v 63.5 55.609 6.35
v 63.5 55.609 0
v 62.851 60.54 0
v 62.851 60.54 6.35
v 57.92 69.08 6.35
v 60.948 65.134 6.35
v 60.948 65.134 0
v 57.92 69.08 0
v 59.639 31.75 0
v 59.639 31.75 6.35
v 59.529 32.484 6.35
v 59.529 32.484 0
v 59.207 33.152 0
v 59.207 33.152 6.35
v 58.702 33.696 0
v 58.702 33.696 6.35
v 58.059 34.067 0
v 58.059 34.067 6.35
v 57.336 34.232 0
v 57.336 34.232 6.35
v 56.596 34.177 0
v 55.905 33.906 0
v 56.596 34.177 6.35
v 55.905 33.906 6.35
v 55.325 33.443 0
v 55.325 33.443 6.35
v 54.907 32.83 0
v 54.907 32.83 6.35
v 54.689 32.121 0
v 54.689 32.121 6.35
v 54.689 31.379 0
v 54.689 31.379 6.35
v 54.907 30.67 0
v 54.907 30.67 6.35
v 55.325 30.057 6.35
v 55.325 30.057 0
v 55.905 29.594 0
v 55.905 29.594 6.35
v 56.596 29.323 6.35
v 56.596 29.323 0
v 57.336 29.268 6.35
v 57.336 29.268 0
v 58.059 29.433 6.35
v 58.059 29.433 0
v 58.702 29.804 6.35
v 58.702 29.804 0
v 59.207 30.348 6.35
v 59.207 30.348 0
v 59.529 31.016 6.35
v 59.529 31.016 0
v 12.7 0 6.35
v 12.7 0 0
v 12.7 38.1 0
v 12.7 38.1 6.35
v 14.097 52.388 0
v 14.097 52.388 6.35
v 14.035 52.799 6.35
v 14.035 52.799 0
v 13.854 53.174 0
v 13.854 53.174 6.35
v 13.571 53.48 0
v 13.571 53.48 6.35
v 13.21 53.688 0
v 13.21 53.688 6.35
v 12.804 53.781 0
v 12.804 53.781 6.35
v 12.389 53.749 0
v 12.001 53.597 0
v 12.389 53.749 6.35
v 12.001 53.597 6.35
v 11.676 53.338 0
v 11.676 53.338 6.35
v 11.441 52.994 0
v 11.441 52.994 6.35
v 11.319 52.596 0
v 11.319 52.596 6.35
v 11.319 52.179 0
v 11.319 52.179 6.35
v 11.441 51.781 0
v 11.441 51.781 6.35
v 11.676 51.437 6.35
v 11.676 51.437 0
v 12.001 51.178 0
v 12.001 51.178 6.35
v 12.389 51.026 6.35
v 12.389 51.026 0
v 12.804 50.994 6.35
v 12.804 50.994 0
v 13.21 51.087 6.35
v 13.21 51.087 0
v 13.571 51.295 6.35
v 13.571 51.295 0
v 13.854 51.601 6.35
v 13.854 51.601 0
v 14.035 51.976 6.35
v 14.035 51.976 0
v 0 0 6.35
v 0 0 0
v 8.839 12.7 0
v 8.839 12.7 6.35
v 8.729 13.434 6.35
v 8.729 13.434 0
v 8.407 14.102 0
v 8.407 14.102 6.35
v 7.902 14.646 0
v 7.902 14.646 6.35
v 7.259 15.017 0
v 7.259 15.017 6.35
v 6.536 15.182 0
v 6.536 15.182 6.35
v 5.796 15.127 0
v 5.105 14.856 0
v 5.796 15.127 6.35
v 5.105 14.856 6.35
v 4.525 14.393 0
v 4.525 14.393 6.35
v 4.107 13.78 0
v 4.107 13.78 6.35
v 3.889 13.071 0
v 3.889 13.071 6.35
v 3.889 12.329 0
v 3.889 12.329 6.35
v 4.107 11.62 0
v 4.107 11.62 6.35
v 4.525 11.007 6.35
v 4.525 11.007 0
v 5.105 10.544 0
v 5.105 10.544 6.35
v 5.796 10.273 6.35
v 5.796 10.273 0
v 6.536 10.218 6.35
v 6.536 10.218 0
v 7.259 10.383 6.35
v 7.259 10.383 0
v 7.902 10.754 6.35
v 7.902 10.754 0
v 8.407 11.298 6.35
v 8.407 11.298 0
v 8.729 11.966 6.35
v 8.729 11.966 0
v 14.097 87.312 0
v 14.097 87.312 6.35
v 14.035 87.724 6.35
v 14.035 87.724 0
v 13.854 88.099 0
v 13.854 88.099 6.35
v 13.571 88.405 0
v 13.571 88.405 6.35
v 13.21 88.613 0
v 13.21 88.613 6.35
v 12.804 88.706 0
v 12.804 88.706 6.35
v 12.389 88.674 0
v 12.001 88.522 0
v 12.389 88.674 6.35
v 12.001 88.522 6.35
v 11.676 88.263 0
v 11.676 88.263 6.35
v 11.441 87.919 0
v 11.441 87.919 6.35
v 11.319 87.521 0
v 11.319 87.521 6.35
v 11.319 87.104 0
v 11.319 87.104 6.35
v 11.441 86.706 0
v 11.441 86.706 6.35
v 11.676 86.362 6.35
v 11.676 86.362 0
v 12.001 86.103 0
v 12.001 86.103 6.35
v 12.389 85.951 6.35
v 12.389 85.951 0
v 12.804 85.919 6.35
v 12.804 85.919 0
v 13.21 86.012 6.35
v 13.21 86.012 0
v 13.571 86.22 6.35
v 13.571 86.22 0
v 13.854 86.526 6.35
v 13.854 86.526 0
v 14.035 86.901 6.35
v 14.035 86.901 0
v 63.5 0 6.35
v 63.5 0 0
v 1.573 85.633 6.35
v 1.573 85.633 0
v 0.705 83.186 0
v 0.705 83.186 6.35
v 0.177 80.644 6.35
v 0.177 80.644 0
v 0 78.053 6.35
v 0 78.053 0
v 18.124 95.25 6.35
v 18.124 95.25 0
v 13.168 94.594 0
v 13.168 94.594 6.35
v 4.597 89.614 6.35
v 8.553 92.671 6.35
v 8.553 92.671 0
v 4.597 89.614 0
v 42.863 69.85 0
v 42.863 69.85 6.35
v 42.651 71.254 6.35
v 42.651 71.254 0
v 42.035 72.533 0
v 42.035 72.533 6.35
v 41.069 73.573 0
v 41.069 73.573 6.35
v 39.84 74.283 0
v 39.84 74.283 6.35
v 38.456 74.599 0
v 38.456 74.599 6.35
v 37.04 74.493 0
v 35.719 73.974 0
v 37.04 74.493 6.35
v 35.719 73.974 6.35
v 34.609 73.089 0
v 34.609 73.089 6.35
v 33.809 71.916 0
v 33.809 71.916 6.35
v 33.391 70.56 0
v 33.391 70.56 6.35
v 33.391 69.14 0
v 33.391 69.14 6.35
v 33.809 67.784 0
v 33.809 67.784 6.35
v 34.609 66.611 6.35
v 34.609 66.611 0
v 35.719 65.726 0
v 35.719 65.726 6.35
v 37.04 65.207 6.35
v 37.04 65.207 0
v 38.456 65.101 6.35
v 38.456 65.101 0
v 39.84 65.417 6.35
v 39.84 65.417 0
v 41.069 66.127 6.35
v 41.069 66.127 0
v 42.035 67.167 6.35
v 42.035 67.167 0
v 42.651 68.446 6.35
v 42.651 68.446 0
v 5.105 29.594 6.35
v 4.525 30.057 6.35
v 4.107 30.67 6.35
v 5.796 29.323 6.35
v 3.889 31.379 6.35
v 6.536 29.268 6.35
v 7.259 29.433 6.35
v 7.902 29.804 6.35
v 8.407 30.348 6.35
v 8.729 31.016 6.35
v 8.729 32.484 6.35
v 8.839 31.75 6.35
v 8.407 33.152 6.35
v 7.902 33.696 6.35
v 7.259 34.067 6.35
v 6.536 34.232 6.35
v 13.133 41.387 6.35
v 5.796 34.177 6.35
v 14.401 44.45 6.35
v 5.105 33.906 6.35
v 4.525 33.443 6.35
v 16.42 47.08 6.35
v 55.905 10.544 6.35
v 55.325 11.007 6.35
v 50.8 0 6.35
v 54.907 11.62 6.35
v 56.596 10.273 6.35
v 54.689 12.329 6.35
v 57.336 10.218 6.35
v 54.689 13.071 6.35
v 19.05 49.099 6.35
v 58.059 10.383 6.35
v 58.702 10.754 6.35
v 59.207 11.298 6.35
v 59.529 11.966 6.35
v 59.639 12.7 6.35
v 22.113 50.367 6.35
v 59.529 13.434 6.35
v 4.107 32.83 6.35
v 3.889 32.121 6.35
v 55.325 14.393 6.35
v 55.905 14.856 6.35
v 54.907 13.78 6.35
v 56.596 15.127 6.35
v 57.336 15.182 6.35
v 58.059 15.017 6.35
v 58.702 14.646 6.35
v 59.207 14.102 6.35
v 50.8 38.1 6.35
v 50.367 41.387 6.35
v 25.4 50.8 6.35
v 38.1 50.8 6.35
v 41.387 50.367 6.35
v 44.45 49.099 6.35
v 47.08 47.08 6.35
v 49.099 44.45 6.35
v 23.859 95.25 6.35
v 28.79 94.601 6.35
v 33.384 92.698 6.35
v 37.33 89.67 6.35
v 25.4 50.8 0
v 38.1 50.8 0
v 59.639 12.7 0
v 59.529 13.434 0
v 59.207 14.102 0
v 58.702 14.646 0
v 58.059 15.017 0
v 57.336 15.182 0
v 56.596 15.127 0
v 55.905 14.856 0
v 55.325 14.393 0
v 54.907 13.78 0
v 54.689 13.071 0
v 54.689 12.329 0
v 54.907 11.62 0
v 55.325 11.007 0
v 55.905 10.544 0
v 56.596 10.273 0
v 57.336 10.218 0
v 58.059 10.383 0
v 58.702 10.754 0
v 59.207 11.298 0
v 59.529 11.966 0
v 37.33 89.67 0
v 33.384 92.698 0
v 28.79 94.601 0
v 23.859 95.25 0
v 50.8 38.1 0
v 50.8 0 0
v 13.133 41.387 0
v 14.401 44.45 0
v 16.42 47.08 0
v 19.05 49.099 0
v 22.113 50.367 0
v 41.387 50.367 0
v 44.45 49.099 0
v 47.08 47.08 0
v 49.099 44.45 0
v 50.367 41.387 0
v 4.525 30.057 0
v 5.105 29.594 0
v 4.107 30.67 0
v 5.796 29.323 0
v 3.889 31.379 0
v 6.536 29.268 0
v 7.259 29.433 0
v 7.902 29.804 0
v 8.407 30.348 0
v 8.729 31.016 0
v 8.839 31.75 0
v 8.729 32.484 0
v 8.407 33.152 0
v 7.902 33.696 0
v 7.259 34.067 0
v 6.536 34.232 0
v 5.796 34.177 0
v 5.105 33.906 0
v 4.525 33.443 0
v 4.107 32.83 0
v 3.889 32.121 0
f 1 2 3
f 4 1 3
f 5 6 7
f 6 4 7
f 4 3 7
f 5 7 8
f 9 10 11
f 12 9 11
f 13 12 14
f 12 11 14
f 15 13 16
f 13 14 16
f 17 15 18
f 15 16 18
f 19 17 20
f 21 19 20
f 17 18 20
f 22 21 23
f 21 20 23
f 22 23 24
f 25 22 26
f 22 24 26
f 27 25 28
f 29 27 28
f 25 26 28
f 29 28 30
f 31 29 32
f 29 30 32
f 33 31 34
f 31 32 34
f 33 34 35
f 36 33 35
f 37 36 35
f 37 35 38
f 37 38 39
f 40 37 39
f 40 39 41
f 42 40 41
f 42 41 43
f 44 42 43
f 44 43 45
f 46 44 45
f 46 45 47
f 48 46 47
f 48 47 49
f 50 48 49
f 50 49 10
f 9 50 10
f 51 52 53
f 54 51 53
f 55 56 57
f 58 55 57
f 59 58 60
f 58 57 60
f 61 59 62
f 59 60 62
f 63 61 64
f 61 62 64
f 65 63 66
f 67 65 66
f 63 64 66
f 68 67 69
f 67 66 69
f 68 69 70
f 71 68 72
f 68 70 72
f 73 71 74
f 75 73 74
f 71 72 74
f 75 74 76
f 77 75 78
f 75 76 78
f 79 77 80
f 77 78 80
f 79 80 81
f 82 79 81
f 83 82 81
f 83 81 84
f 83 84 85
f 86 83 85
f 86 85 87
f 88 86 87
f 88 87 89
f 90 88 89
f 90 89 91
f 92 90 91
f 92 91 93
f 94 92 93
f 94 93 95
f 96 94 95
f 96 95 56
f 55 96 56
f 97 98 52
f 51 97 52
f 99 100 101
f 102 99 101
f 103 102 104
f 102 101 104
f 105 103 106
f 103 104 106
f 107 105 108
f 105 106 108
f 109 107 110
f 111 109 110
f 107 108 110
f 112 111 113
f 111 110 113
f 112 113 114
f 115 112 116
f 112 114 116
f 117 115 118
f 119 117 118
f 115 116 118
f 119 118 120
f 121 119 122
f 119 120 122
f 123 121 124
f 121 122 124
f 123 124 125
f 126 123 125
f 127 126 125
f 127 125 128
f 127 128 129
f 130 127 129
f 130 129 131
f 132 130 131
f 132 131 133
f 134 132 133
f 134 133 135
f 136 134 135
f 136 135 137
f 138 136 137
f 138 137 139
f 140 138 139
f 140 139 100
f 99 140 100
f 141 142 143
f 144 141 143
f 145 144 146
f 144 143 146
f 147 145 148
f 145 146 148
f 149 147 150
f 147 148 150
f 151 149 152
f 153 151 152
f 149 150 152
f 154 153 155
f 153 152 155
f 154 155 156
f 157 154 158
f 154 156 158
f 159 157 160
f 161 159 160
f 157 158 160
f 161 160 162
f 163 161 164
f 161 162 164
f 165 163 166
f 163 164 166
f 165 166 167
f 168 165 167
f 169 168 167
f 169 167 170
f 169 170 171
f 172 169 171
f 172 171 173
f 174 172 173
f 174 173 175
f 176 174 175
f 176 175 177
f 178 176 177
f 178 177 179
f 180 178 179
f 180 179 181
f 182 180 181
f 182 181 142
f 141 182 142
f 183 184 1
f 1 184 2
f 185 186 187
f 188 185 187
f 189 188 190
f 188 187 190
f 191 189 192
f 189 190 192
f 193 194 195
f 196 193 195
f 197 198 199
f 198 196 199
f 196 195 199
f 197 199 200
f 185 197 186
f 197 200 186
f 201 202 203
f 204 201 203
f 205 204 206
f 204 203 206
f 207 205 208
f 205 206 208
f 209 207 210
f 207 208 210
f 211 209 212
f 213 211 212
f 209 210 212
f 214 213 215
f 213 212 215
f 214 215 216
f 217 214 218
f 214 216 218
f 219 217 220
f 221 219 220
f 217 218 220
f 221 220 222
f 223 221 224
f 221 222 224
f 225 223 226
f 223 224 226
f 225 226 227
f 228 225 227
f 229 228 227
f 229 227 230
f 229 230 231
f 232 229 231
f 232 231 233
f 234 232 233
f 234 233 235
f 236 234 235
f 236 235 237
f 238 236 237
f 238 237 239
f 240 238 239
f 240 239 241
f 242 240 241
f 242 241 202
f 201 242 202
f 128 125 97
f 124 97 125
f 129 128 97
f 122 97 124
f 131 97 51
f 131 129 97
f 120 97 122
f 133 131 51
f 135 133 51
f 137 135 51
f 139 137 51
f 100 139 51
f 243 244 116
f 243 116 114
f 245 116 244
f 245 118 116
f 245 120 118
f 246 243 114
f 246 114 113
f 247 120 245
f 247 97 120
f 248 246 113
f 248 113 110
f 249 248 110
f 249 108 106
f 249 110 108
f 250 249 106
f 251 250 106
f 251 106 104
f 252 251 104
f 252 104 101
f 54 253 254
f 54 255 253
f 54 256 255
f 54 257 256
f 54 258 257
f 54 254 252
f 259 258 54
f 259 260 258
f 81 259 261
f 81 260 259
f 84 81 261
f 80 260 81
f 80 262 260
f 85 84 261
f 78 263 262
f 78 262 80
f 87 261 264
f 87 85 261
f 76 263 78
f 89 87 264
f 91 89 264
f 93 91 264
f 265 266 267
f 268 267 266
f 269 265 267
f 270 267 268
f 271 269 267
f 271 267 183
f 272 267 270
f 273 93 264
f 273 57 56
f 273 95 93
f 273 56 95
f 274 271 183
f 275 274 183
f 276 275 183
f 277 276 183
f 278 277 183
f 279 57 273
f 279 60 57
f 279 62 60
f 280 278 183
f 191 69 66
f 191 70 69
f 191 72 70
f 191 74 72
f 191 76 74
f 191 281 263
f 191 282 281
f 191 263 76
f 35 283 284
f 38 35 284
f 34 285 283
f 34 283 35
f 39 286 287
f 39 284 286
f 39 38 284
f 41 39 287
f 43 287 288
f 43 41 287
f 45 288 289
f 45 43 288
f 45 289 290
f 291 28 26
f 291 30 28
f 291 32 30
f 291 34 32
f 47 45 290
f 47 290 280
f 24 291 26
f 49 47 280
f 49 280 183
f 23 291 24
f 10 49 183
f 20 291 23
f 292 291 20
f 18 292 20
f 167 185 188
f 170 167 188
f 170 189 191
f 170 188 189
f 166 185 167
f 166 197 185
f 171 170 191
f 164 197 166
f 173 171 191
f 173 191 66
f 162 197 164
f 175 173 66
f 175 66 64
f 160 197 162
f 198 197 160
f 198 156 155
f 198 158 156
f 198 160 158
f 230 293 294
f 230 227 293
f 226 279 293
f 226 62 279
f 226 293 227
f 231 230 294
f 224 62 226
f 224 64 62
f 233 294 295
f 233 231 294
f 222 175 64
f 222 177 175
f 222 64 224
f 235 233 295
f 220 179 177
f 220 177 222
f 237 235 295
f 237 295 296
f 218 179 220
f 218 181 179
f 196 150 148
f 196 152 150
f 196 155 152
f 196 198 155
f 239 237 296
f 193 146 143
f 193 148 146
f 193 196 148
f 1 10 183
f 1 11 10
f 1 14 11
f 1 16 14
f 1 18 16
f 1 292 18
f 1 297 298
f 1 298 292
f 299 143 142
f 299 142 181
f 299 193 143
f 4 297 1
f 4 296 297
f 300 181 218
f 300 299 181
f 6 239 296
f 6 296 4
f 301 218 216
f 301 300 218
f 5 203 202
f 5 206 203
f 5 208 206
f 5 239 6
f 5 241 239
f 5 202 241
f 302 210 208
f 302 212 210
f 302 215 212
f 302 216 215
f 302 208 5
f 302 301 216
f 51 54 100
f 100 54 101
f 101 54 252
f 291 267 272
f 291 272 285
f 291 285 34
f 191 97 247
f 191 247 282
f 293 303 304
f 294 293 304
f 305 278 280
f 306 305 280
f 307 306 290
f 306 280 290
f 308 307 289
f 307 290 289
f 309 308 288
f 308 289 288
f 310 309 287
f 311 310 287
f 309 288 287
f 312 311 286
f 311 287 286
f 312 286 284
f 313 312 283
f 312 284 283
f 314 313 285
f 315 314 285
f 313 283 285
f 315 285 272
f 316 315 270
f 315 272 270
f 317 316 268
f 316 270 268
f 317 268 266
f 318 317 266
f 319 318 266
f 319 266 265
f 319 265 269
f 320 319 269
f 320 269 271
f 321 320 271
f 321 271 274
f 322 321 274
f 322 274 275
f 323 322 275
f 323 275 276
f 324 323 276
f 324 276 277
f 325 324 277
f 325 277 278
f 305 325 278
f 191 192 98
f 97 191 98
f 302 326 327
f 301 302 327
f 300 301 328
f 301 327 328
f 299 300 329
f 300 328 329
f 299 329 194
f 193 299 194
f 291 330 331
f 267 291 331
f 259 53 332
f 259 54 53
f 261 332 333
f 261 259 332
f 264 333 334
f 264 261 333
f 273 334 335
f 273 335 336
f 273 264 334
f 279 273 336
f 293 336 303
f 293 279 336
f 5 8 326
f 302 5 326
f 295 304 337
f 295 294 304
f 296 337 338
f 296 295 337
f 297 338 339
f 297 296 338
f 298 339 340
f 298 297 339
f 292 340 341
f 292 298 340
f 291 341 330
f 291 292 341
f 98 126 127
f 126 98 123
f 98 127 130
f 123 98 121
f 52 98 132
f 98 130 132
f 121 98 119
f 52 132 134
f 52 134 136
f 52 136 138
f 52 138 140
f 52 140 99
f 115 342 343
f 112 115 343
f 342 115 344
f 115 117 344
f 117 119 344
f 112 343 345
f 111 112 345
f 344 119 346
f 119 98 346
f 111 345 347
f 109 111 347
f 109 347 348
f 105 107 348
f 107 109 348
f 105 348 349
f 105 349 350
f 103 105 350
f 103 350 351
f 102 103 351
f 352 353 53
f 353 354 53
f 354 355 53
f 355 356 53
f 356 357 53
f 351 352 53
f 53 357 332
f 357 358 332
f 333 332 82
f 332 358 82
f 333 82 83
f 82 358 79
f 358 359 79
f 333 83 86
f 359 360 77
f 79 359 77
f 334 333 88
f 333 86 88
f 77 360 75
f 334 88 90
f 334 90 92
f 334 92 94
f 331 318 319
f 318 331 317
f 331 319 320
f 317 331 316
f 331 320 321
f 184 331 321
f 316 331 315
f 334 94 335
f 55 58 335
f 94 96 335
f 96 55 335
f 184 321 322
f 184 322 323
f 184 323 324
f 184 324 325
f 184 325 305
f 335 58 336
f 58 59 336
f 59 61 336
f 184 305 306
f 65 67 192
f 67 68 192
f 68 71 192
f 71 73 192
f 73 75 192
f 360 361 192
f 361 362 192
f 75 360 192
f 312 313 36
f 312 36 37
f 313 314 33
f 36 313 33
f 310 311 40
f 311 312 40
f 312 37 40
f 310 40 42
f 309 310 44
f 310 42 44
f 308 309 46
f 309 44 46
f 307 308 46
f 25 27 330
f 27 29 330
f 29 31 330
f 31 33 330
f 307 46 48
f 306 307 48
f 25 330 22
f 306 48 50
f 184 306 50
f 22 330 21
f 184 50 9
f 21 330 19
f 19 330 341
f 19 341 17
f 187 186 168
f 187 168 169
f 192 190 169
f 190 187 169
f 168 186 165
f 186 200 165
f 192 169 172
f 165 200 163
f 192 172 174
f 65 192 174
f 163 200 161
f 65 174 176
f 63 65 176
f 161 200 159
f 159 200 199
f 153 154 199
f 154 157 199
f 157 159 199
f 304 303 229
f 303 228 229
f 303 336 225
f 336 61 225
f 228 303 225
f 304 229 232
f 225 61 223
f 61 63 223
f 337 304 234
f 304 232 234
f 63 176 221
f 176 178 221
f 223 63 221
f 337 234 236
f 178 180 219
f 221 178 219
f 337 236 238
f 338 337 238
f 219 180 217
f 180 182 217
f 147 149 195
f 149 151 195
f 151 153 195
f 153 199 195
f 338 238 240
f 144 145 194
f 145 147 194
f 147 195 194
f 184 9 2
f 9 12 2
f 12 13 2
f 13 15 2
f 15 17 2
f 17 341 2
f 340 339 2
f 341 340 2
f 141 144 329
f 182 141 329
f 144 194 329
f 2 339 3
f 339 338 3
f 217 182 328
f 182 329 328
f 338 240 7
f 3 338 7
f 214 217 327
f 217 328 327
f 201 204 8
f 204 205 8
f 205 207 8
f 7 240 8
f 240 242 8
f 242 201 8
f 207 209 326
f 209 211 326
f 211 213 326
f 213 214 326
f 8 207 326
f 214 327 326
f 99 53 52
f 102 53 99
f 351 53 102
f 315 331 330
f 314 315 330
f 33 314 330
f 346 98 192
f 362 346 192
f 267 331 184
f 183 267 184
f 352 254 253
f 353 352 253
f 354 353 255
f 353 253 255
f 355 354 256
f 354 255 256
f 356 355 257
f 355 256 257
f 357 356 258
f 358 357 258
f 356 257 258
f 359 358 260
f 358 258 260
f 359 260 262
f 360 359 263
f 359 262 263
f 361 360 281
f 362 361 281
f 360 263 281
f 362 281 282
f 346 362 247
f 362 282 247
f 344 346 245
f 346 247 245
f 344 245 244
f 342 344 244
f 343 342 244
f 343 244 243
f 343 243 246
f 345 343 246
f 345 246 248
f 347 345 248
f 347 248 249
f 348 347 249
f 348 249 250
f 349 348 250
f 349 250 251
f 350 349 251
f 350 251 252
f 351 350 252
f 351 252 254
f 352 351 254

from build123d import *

# Parameters (mm, degrees)
BOSS_EXTRUDE1_DEPTH = 6.35
CUT_EXTRUDE1_REACH  = 116.652
SKETCH2_R           = 2.4892
CUT_EXTRUDE3_REACH  = 116.652
SKETCH4_R           = 1.397
SKETCH4_R_2         = 4.7625
FILLET4_R           = 12.7
FILLET5_R           = 19.05


with BuildPart() as part:
    # Sketch1 → Boss-Extrude1 (new body)
    with BuildSketch(Plane.XY):
        Polygon((0, 0), (12.7, 0), (12.7, 50.8), (50.8, 50.8), (50.8, 0), (63.5, 0), (63.5, 63.5), (31.75, 95.25), (6.35, 95.25), (0, 82.55), align=None)
    extrude(amount=BOSS_EXTRUDE1_DEPTH)

    # Sketch2 → Cut-Extrude1 (cut, up to next)
    with BuildSketch(Plane.XY.offset(6.35), mode=Mode.PRIVATE) as cut_extrude1_sk1:
        with Locations((6.35, 12.7)):
            Circle(SKETCH2_R)
    cut_extrude1_tool1 = extrude(cut_extrude1_sk1.sketch, amount=-CUT_EXTRUDE1_REACH, mode=Mode.PRIVATE) & part.part
    # Sketch2 → Cut-Extrude1 (cut, up to next)
    with BuildSketch(Plane.XY.offset(6.35), mode=Mode.PRIVATE) as cut_extrude1_sk2:
        with Locations((6.35, 31.75)):
            Circle(SKETCH2_R)
    cut_extrude1_tool2 = extrude(cut_extrude1_sk2.sketch, amount=-CUT_EXTRUDE1_REACH, mode=Mode.PRIVATE) & part.part
    # Sketch2 → Cut-Extrude1 (cut, up to next)
    with BuildSketch(Plane.XY.offset(6.35), mode=Mode.PRIVATE) as cut_extrude1_sk3:
        with Locations((57.15, 12.7)):
            Circle(SKETCH2_R)
    cut_extrude1_tool3 = extrude(cut_extrude1_sk3.sketch, amount=-CUT_EXTRUDE1_REACH, mode=Mode.PRIVATE) & part.part
    # Sketch2 → Cut-Extrude1 (cut, up to next)
    with BuildSketch(Plane.XY.offset(6.35), mode=Mode.PRIVATE) as cut_extrude1_sk4:
        with Locations((57.15, 31.75)):
            Circle(SKETCH2_R)
    cut_extrude1_tool4 = extrude(cut_extrude1_sk4.sketch, amount=-CUT_EXTRUDE1_REACH, mode=Mode.PRIVATE) & part.part
    add(cut_extrude1_tool1.solids().sort_by_distance((6.35, 12.7, 6.35))[0], mode=Mode.SUBTRACT)
    add(cut_extrude1_tool2.solids().sort_by_distance((6.35, 31.75, 6.35))[0], mode=Mode.SUBTRACT)
    add(cut_extrude1_tool3.solids().sort_by_distance((57.15, 12.7, 6.35))[0], mode=Mode.SUBTRACT)
    add(cut_extrude1_tool4.solids().sort_by_distance((57.15, 31.75, 6.35))[0], mode=Mode.SUBTRACT)

    # Sketch4 → Cut-Extrude3 (cut, up to next)
    with BuildSketch(Plane.XY.offset(6.35), mode=Mode.PRIVATE) as cut_extrude3_sk1:
        with Locations((12.7, 52.3875)):
            Circle(SKETCH4_R)
    cut_extrude3_tool1 = extrude(cut_extrude3_sk1.sketch, amount=-CUT_EXTRUDE3_REACH, mode=Mode.PRIVATE) & part.part
    # Sketch4 → Cut-Extrude3 (cut, up to next)
    with BuildSketch(Plane.XY.offset(6.35), mode=Mode.PRIVATE) as cut_extrude3_sk2:
        with Locations((12.7, 87.3125)):
            Circle(SKETCH4_R)
    cut_extrude3_tool2 = extrude(cut_extrude3_sk2.sketch, amount=-CUT_EXTRUDE3_REACH, mode=Mode.PRIVATE) & part.part
    # Sketch4 → Cut-Extrude3 (cut, up to next)
    with BuildSketch(Plane.XY.offset(6.35), mode=Mode.PRIVATE) as cut_extrude3_sk3:
        with Locations((38.1, 69.85)):
            Circle(SKETCH4_R_2)
    cut_extrude3_tool3 = extrude(cut_extrude3_sk3.sketch, amount=-CUT_EXTRUDE3_REACH, mode=Mode.PRIVATE) & part.part
    add(cut_extrude3_tool1.solids().sort_by_distance((12.7, 52.3875, 6.35))[0], mode=Mode.SUBTRACT)
    add(cut_extrude3_tool2.solids().sort_by_distance((12.7, 87.3125, 6.35))[0], mode=Mode.SUBTRACT)
    add(cut_extrude3_tool3.solids().sort_by_distance((38.1, 69.85, 6.35))[0], mode=Mode.SUBTRACT)

    # Fillet4
    fillet4_edges = [part.edges().sort_by_distance(p)[0] for p in [
        (50.8, 50.8, 3.175),
        (12.7, 50.8, 3.175),
    ]]
    fillet(fillet4_edges, radius=FILLET4_R)

    # Fillet5
    # the kernel refuses this fillet: 19.05 mm, written as the material it takes off along each edge
    with BuildSketch(Plane(origin=(0, 82.55, -11.242737428), x_dir=(0, -1, 0), z_dir=(0, 0, 1))) as fillet5_piece_1:
        with BuildLine():
            CenterArc((FILLET5_R * 0.2360679775, FILLET5_R), FILLET5_R, 243.434948823, 26.565051177)
            Line((-FILLET5_R * 0.211145618, FILLET5_R * 0.105572809), (0, 0))
            Line((0, 0), (FILLET5_R * 0.2360679775, 0))
        make_face()
    extrude(amount=28.835474857, mode=Mode.SUBTRACT)
    with BuildSketch(Plane(origin=(6.35, 95.25, -29.433868714), x_dir=(-0.4472135954999575, -0.8944271909999162, 0), z_dir=(0, 0, 1))) as fillet5_piece_2:
        with BuildLine():
            CenterArc((FILLET5_R * 0.61803398875, FILLET5_R), FILLET5_R, 206.565051177, 63.434948823)
            Line((-FILLET5_R * 0.27639320225, FILLET5_R * 0.5527864045), (0, 0))
            Line((0, 0), (FILLET5_R * 0.61803398875, 0))
        make_face()
    extrude(amount=65.217737428, mode=Mode.SUBTRACT)
    with BuildSketch(Plane(origin=(31.75, 95.25, -19.726920908), x_dir=(-1, 0, 0), z_dir=(0, 0, 1)), Plane(origin=(63.5, 63.5, -19.726920908), x_dir=(-0.7071067811865476, 0.7071067811865476, 0), z_dir=(0, 0, 1))) as fillet5_piece_3:
        with BuildLine():
            CenterArc((FILLET5_R * 0.414213562373, FILLET5_R), FILLET5_R, 225, 45)
            Line((-FILLET5_R * 0.292893218813, FILLET5_R * 0.292893218813), (0, 0))
            Line((0, 0), (FILLET5_R * 0.414213562373, 0))
        make_face()
    extrude(amount=45.803841816, mode=Mode.SUBTRACT)


solid = part.part
